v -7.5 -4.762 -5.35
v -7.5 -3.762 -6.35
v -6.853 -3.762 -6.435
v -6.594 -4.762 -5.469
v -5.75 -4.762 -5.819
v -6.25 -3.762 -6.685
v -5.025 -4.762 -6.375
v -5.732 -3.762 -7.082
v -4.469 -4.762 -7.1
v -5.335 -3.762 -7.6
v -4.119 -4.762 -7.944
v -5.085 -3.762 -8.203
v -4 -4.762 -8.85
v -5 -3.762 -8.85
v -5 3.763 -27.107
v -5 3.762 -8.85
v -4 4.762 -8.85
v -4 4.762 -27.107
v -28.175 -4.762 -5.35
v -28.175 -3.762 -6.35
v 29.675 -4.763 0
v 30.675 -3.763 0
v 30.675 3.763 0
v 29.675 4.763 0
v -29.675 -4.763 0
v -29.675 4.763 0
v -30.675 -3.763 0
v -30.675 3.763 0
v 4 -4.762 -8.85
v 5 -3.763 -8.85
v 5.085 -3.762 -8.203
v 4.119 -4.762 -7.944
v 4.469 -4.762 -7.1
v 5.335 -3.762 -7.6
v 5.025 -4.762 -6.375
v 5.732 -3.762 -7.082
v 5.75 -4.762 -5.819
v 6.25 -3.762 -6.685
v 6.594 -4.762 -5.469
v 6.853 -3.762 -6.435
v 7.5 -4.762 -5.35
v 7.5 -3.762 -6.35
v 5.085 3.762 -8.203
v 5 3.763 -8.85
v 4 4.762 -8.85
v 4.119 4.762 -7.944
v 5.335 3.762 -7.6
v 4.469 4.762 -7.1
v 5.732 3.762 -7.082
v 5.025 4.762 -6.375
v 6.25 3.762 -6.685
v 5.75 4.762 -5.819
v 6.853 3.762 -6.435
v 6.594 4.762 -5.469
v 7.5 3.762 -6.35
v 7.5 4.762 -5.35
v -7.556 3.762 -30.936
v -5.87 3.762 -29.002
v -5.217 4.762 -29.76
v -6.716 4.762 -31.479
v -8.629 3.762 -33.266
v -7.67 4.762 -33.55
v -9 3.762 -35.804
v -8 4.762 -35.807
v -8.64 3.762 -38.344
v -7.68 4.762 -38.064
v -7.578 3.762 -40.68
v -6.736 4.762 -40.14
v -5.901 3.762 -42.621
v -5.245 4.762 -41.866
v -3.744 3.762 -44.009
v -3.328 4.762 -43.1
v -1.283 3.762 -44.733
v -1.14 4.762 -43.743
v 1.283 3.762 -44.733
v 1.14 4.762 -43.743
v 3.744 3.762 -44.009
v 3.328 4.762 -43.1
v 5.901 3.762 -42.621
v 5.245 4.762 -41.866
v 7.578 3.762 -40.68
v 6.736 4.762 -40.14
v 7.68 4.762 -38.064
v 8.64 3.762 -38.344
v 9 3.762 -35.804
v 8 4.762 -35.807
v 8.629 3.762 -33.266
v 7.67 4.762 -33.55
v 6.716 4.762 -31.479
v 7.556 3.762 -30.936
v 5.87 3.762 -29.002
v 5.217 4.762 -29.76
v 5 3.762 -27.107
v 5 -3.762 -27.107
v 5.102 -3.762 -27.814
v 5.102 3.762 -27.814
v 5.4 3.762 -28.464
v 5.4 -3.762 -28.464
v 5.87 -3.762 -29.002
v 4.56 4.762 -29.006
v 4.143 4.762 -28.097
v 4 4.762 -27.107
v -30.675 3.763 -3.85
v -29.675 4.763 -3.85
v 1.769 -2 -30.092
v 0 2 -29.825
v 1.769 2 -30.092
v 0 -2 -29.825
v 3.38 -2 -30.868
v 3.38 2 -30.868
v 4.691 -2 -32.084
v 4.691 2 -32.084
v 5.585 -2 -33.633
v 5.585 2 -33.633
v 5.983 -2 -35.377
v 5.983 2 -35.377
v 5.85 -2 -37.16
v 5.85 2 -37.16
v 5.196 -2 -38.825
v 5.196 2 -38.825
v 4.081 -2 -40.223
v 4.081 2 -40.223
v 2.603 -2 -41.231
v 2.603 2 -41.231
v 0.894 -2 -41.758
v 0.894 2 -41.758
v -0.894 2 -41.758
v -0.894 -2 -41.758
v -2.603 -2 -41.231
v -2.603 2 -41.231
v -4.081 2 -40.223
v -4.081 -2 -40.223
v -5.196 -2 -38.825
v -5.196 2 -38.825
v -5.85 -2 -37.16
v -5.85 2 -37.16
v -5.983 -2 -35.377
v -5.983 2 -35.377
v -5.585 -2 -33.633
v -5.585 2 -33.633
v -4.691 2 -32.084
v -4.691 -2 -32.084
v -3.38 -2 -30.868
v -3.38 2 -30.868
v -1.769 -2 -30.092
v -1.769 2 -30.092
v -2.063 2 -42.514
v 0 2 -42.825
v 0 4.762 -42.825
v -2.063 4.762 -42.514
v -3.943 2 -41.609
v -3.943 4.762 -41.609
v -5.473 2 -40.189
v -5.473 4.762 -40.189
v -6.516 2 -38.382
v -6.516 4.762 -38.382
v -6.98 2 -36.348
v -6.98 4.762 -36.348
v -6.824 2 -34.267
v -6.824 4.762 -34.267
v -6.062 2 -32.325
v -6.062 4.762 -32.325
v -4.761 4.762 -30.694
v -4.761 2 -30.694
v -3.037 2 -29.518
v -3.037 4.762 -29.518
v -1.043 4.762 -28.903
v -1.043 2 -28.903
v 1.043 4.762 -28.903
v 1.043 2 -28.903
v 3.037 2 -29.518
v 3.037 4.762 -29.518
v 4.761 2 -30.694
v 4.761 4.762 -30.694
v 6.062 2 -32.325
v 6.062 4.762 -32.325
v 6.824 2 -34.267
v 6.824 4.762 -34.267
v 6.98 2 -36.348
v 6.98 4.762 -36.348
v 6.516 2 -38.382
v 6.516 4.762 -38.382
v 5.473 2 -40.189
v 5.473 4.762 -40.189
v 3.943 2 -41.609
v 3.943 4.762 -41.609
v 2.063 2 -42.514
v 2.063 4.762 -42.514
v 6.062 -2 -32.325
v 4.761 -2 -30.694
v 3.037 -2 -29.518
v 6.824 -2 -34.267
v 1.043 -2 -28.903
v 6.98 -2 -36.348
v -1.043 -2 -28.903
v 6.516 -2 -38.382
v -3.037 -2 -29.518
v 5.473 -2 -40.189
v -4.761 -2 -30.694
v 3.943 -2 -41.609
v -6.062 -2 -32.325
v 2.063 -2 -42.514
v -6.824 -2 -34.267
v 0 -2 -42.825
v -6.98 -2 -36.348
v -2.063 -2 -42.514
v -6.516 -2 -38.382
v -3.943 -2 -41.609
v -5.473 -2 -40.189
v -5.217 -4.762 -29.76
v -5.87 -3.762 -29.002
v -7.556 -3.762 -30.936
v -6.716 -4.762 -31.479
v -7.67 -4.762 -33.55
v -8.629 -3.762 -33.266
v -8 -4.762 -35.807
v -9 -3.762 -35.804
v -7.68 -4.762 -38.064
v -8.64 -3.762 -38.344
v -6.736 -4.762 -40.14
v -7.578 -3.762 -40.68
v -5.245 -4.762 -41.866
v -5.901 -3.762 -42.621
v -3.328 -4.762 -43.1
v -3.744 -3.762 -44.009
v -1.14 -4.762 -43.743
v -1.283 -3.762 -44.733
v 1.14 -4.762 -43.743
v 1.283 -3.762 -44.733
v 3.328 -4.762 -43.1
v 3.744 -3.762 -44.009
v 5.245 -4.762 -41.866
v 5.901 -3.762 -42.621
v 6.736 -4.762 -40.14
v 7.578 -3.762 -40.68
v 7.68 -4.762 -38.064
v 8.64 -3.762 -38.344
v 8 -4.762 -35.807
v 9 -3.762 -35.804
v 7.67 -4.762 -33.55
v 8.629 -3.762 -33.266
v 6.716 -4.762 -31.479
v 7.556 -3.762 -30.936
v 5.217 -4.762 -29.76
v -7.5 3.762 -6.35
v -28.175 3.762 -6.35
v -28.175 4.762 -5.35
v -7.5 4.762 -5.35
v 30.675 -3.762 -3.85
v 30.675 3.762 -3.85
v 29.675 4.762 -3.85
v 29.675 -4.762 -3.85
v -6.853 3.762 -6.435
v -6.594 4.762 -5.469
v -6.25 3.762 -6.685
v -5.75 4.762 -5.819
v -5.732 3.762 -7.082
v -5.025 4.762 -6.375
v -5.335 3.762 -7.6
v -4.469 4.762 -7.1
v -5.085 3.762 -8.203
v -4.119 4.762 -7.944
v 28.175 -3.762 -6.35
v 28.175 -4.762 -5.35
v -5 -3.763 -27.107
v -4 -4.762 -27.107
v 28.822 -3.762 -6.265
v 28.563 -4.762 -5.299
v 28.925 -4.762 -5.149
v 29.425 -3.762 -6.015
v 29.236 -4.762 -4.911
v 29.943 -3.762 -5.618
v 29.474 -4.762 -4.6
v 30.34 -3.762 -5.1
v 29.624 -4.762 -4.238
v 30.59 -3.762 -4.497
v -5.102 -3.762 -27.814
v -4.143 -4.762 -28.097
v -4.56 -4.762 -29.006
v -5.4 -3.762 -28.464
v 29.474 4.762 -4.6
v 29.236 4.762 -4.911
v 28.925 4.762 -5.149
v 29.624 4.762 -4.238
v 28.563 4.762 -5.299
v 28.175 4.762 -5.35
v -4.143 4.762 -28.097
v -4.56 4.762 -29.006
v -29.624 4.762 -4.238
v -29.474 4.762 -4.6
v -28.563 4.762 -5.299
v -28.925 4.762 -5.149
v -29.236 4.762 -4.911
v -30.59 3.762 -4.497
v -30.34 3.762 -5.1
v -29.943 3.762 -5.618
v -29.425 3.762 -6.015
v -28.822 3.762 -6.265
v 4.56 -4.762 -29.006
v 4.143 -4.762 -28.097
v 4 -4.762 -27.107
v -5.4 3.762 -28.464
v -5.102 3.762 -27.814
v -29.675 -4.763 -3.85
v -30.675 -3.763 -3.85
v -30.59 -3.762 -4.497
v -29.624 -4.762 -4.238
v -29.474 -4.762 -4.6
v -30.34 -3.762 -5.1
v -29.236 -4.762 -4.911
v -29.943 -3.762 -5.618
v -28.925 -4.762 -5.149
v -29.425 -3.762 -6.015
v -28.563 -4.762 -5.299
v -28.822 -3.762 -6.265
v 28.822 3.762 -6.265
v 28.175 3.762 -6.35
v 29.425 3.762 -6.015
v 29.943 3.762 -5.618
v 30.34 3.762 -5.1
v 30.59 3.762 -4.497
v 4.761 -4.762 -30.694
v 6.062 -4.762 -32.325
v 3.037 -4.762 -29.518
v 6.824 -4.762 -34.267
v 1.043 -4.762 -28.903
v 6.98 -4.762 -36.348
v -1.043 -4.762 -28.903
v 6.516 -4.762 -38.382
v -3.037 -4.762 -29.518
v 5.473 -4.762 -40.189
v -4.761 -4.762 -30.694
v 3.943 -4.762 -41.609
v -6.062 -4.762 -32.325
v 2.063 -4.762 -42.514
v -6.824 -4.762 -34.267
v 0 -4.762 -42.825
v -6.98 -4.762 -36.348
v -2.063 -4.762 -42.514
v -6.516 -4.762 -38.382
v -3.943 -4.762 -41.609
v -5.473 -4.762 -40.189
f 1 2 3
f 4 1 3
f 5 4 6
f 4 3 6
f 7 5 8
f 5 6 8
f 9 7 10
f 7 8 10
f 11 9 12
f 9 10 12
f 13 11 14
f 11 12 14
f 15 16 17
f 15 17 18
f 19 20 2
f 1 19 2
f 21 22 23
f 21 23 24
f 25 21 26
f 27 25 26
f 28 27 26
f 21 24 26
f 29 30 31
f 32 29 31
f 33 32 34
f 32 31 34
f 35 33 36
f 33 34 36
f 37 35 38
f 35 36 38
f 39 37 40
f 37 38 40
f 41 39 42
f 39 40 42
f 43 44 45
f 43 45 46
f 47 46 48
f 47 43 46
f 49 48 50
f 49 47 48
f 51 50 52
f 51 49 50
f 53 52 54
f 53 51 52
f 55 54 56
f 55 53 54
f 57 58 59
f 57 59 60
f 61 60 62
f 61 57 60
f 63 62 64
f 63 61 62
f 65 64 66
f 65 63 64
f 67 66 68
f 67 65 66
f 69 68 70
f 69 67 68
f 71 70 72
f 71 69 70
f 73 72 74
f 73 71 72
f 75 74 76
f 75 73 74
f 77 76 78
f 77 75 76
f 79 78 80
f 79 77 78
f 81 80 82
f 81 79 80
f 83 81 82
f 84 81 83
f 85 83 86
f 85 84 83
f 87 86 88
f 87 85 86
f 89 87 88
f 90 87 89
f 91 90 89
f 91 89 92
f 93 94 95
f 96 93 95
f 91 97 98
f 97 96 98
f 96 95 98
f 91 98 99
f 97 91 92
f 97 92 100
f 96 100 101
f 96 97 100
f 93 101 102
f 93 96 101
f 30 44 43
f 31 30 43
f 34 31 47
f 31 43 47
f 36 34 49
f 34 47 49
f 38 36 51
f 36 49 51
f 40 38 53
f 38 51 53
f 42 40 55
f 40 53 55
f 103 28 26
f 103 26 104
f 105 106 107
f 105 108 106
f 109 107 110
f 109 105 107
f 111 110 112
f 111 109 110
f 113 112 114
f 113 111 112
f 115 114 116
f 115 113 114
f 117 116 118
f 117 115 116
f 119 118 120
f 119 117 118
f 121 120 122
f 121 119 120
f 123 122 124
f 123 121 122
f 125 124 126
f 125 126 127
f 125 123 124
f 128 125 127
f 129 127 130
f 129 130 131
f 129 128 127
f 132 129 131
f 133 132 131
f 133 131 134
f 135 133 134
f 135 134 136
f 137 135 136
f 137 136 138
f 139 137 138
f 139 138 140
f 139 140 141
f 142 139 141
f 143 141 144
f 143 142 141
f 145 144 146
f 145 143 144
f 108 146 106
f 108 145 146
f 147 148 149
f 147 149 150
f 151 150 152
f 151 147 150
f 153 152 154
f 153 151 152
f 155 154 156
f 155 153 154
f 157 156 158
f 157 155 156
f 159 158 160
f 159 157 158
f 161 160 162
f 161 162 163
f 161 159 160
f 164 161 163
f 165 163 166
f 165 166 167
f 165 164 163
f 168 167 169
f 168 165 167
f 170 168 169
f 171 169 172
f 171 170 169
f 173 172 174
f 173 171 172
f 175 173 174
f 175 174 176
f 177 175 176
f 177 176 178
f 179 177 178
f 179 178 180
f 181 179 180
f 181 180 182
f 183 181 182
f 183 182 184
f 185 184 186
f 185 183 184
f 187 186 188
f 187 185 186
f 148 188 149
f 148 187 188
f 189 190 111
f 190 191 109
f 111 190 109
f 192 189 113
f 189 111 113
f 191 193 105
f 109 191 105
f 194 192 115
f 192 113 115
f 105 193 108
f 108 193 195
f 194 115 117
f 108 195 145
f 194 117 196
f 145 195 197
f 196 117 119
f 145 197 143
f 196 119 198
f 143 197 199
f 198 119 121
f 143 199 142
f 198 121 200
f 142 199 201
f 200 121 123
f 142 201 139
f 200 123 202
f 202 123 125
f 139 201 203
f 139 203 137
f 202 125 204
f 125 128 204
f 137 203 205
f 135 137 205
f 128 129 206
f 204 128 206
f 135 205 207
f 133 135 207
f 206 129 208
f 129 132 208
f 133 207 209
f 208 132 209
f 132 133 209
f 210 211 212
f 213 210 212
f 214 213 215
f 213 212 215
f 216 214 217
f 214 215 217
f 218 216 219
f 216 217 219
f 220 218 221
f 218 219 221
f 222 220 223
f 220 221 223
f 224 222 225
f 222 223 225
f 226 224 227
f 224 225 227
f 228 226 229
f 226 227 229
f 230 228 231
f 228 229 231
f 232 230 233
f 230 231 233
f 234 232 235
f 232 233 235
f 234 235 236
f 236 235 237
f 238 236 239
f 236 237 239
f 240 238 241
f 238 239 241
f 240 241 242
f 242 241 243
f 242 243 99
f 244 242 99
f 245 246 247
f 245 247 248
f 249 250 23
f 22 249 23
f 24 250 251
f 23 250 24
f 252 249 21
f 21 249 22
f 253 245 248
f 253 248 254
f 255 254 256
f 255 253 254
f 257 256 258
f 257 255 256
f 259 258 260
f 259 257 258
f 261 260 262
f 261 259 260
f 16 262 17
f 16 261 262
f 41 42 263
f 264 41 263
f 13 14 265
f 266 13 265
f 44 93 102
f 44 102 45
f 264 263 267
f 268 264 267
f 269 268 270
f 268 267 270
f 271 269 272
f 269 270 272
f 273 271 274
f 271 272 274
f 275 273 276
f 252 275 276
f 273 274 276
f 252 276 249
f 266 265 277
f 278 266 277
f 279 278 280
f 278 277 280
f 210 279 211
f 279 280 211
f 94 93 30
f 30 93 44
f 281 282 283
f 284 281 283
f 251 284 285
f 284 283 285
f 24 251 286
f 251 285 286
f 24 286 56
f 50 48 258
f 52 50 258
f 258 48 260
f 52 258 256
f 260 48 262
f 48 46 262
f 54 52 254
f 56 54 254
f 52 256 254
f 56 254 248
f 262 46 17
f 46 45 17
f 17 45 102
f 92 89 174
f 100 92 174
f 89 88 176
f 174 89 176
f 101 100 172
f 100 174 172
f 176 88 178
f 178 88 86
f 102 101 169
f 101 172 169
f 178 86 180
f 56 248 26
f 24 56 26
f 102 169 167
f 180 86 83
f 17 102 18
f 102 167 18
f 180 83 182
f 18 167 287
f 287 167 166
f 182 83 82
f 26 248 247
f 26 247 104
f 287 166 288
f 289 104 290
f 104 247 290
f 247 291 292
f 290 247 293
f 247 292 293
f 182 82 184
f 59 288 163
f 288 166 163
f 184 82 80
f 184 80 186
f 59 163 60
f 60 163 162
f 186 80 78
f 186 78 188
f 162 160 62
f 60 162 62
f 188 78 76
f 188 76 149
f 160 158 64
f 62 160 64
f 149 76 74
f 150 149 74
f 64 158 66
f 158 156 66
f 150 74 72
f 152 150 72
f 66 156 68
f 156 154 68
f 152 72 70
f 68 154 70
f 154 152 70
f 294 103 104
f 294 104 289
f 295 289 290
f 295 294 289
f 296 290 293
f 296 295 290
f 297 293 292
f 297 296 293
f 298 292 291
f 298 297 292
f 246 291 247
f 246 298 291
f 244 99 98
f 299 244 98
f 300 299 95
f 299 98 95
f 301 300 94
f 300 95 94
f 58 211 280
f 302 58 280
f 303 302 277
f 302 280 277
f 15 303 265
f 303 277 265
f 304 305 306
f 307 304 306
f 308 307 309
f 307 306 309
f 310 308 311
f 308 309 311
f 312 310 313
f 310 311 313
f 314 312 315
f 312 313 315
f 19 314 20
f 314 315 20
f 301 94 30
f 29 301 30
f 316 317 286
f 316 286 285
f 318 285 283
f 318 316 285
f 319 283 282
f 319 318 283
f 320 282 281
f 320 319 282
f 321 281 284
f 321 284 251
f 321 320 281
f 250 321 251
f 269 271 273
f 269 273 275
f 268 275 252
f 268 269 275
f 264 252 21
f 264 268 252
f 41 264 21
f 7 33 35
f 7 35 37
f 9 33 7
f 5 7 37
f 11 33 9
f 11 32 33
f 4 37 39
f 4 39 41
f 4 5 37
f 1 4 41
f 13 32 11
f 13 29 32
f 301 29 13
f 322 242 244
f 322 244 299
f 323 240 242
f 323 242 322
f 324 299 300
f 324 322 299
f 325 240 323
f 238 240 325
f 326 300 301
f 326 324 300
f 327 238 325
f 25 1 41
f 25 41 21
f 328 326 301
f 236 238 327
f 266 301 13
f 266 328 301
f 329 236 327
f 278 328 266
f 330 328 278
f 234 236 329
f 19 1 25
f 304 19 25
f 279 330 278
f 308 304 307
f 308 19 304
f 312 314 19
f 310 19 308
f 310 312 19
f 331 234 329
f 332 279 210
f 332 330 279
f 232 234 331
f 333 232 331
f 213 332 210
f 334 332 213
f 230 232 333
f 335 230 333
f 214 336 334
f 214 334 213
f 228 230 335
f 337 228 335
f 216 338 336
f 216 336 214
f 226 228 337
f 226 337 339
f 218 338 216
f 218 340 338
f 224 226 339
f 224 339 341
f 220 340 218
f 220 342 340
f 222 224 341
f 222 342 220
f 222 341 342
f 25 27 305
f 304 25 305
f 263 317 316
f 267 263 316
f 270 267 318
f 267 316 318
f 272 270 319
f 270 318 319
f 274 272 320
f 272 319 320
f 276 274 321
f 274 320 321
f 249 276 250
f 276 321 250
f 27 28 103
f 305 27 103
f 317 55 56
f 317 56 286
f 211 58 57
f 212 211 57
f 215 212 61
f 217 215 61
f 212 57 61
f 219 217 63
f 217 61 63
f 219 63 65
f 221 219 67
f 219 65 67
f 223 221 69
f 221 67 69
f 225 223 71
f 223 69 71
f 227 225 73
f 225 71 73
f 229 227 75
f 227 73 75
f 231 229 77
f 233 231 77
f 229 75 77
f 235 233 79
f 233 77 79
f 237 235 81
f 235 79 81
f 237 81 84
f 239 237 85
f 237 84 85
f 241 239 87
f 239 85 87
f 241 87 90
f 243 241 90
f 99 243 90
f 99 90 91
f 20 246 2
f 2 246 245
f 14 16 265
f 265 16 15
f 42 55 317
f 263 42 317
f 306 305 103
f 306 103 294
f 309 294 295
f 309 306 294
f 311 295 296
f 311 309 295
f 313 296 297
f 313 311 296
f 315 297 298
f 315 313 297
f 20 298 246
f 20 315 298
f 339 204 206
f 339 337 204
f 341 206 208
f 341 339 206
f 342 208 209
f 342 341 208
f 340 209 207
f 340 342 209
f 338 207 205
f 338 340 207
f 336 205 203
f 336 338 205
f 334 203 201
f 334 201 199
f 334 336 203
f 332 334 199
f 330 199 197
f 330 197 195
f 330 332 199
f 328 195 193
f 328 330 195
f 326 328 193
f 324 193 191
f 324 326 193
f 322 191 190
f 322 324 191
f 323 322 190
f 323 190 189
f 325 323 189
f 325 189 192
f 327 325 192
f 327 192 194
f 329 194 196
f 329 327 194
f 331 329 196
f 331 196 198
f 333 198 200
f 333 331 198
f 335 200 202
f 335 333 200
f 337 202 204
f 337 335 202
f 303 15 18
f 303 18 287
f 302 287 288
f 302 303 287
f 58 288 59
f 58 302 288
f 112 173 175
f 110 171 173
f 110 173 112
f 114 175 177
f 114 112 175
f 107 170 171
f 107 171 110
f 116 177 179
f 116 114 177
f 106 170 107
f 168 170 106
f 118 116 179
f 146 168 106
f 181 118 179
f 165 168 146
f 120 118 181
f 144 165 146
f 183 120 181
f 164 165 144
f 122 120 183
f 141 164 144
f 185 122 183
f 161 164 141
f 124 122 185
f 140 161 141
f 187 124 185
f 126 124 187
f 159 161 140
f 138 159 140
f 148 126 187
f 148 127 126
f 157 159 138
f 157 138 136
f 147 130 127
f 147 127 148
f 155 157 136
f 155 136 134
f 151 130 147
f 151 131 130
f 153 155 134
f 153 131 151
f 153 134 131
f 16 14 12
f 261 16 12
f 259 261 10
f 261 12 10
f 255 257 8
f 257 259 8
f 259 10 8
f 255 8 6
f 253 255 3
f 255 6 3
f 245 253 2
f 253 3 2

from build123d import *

# Parameters (mm, degrees)
SKETCH1_R           = 7
BOSS_EXTRUDE1_DEPTH = 4.7625
FILLET1_R           = 2.5
CHAMFER1_SIZE       = 1
SKETCH3_R           = 7
SKETCH3_R_2         = 6
BOSS_EXTRUDE2_DEPTH = 2


with BuildPart() as part:
    # Sketch1 → Boss-Extrude1 (new, symmetric)
    with BuildSketch(Plane(origin=(0, 0, 0), x_dir=(1, 0, 0), z_dir=(0, 1, 0))):
        with BuildLine():
            Line((-30.675, 0), (-30.675, 6.35))
            Line((-30.675, 6.35), (-5, 6.35))
            Line((-5, 6.35), (-5, 28.341685226))
            ThreePointArc((-5, 28.341685226), (0, 44.825), (5, 28.341685226))
            Line((5, 28.341685226), (5, 6.35))
            Line((5, 6.35), (30.675, 6.35))
            Line((30.675, 6.35), (30.675, 0))
            Line((30.675, 0), (-30.675, 0))
        make_face()
        with Locations(Location((0, 35.825, 0), (0, 0, 90))):
            Circle(SKETCH1_R, mode=Mode.SUBTRACT)
    extrude(amount=BOSS_EXTRUDE1_DEPTH, both=True)

    # Fillet1
    fillet1_edges = [part.edges().sort_by_distance(p)[0] for p in [
        (-30.675, 0, -6.35),
        (-5, 0, -6.35),
        (-5, 0, -28.341685226),
        (5, 0, -28.341685226),
        (5, 0, -6.35),
        (30.675, 0, -6.35),
    ]]
    fillet(fillet1_edges, radius=FILLET1_R)

    # Chamfer1
    chamfer1_edges = [part.edges().sort_by_distance(p)[0] for p in [
        (30.675, -4.7625, -1.925),
        (-5, -4.7625, -17.978601056),
        (-5, 4.7625, -17.978601056),
        (0, -4.7625, -44.825),
        (0, 4.7625, -44.825),
        (5, -4.7625, -17.978601056),
        (5, 4.7625, -17.978601056),
        (17.8375, -4.7625, -6.35),
        (17.8375, 4.7625, -6.35),
        (-30.675, -4.7625, -1.925),
        (-17.8375, -4.7625, -6.35),
        (-29.942766953, -4.7625, -5.617766953),
        (29.942766953, -4.7625, -5.617766953),
        (-17.8375, 4.7625, -6.35),
        (-30.675, 4.7625, -1.925),
        (-29.942766953, 4.7625, -5.617766953),
        (29.942766953, 4.7625, -5.617766953),
        (-5.227766852, -4.7625, -28.149774183),
        (-5.227766852, 4.7625, -28.149774183),
        (5.227766852, -4.7625, -28.149774183),
        (5.227766852, 4.7625, -28.149774183),
        (5.732233047, -4.7625, -7.082233047),
        (5.732233047, 4.7625, -7.082233047),
        (-5.732233047, -4.7625, -7.082233047),
        (-5.732233047, 4.7625, -7.082233047),
        (30.675, 4.7625, -1.925),
    ]]
    chamfer(chamfer1_edges, length=CHAMFER1_SIZE)

    # Sketch3 → Boss-Extrude2 (add, symmetric)
    with BuildSketch(Plane(origin=(0, 0, 0), x_dir=(1, 0, 0), z_dir=(0, 1, 0))):
        with Locations(Location((0, 35.825, 0), (0, 0, 90))):
            Circle(SKETCH3_R)
        with Locations(Location((0, 35.825, 0), (0, 0, 270))):
            Circle(SKETCH3_R_2, mode=Mode.SUBTRACT)
    extrude(amount=BOSS_EXTRUDE2_DEPTH, both=True)


solid = part.part
